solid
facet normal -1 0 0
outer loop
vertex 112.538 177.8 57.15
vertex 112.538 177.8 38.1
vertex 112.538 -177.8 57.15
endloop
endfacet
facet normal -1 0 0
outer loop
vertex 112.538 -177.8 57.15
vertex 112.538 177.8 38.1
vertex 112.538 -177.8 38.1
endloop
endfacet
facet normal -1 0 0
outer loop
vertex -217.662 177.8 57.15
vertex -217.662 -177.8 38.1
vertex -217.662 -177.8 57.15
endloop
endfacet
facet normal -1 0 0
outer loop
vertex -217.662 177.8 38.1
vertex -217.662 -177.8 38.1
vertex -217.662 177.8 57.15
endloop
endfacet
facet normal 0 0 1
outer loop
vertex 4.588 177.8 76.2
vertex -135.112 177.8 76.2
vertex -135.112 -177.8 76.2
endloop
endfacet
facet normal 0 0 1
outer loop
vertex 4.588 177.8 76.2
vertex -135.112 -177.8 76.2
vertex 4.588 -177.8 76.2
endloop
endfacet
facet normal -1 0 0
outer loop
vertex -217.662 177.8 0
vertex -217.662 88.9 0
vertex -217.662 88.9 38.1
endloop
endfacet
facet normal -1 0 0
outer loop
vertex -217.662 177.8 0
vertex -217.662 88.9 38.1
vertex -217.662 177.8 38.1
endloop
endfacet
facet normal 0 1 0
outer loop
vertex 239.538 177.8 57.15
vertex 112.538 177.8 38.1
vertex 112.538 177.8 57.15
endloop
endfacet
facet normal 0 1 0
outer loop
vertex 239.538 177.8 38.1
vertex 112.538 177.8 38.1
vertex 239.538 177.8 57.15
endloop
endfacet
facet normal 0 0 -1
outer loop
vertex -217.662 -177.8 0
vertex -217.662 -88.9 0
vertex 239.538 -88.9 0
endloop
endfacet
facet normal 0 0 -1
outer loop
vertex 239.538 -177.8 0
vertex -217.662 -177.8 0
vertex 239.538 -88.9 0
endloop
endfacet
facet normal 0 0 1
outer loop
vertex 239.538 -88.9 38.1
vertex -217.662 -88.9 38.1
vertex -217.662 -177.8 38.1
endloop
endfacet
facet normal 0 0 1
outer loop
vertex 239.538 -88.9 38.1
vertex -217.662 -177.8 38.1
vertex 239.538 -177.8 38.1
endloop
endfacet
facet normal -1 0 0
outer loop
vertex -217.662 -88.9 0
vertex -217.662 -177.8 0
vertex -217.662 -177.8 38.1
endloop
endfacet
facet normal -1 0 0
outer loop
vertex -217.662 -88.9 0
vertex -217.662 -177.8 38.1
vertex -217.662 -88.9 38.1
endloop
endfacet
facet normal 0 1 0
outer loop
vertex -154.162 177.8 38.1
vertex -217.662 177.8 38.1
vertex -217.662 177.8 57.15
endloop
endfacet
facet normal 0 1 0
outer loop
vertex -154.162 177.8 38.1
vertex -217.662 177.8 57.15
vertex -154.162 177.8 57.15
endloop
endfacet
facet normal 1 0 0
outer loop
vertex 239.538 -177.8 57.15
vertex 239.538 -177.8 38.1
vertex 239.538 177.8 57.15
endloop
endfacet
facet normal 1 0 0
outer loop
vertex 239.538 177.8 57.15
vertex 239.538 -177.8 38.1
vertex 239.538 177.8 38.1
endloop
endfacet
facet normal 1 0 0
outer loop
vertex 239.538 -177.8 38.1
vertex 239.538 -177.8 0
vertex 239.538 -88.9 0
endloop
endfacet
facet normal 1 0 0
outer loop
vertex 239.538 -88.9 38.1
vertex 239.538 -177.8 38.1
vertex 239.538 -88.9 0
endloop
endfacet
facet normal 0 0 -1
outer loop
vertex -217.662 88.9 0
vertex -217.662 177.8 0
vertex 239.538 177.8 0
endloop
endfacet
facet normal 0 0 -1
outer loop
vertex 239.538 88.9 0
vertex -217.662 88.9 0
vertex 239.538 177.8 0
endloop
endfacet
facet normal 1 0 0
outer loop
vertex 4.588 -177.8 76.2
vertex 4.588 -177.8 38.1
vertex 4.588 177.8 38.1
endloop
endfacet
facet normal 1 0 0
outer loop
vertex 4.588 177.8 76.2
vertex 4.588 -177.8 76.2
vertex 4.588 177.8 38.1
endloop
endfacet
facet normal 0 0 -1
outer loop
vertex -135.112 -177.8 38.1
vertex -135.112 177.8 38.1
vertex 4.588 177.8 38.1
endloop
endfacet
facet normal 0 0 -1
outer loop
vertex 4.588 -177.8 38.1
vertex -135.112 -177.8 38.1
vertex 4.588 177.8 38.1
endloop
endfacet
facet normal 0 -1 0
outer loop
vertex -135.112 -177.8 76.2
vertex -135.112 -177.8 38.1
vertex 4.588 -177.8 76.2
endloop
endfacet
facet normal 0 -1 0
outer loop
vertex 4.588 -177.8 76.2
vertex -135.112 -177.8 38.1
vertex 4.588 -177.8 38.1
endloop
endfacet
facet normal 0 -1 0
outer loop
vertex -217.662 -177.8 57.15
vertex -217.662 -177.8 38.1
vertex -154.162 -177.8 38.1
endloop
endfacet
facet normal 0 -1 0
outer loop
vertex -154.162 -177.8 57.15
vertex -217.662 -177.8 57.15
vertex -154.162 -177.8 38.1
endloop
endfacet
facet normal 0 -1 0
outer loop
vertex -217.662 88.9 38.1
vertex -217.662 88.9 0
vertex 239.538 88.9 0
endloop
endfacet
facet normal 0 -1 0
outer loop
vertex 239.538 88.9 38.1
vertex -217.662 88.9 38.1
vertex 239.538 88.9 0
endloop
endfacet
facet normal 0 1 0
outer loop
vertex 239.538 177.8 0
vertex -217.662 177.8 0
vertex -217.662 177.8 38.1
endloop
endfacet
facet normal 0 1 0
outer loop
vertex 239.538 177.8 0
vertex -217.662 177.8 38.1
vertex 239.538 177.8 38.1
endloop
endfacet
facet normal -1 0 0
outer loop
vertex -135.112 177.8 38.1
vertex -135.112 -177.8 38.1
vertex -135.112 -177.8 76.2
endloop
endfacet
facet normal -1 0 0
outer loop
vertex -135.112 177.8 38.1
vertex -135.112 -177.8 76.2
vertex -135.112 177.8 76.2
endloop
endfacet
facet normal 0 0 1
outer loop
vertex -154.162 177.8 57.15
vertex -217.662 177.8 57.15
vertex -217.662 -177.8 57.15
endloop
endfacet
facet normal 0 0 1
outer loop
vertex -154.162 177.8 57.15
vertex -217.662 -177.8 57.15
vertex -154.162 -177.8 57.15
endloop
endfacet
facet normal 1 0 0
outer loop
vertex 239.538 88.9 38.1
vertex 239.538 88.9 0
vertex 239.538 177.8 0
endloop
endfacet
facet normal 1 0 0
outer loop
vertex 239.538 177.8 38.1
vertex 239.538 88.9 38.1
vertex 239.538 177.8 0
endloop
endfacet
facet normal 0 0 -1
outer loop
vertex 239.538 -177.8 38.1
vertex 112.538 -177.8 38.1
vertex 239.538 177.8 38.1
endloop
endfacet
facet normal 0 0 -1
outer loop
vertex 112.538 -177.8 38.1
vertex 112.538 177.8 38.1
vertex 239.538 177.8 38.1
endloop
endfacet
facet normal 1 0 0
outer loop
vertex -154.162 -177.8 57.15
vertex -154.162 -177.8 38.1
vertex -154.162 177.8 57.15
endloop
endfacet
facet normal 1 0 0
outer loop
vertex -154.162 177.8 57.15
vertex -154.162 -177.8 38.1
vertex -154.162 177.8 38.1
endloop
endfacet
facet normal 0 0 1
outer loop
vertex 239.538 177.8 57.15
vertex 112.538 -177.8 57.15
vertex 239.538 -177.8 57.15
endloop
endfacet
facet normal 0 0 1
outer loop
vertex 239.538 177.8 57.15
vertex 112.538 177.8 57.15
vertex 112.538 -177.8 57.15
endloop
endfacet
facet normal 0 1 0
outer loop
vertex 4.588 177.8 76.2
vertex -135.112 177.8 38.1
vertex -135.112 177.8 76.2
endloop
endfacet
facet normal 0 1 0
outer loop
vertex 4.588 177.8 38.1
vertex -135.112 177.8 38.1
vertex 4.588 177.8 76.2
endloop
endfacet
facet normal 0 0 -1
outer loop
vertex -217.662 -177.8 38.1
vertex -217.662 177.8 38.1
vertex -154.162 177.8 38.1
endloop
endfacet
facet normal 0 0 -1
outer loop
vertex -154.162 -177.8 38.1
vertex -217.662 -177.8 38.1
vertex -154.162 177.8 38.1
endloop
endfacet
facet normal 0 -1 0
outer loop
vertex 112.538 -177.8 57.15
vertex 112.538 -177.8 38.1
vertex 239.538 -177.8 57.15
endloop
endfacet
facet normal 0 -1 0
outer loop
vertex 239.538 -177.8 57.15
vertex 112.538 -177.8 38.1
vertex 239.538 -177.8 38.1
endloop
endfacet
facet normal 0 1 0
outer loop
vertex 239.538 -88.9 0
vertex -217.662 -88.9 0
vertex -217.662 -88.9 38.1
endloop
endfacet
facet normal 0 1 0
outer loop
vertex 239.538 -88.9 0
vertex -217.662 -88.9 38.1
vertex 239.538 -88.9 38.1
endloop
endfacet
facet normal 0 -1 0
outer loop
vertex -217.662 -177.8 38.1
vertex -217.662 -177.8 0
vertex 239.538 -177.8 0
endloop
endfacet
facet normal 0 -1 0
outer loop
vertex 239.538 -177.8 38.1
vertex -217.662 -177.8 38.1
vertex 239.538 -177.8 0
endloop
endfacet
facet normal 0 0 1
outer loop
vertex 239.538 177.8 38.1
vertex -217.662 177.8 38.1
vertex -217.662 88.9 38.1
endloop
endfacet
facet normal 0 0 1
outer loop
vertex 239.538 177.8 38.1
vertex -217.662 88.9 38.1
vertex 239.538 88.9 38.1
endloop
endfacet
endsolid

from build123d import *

# Parameters (mm, degrees)
SKETCH2_W             = 457.2
SKETCH2_H             = 88.9
BOSS_EXTRUDE1_DEPTH   = 38.1
BOSS_EXTRUDE1_2_DEPTH = 38.1
SKETCH3_W             = 63.5
SKETCH3_H             = 355.6
BOSS_EXTRUDE2_DEPTH   = 19.05
SKETCH3_W_2           = 127
BOSS_EXTRUDE2_2_DEPTH = 19.05
SKETCH3_3_W           = 139.7
SKETCH3_3_H           = 355.6
BOSS_EXTRUDE3_DEPTH   = 38.1


with BuildPart() as part:
    # Sketch2 → Boss-Extrude1 (new body)
    with BuildSketch(Plane.XY):
        with Locations((10.938284773, 133.35)):
            Rectangle(SKETCH2_W, SKETCH2_H)
    extrude(amount=BOSS_EXTRUDE1_DEPTH)


with BuildPart() as body_2:
    # Sketch2 → Boss-Extrude1 2 (new body)
    with BuildSketch(Plane.XY):
        with Locations((10.938284773, -133.35)):
            Rectangle(SKETCH2_W, SKETCH2_H)
    extrude(amount=BOSS_EXTRUDE1_2_DEPTH)


with BuildPart() as body_3:
    # Sketch3 → Boss-Extrude2 (new body)
    with BuildSketch(Plane.XY.offset(38.1)):
        with Locations((-185.911715227, 0)):
            Rectangle(SKETCH3_W, SKETCH3_H)
    extrude(amount=BOSS_EXTRUDE2_DEPTH)


with BuildPart() as body_4:
    # Sketch3 → Boss-Extrude2 2 (new body)
    with BuildSketch(Plane.XY.offset(38.1)):
        with Locations((176.038284773, 0)):
            Rectangle(SKETCH3_W_2, SKETCH3_H)
    extrude(amount=BOSS_EXTRUDE2_2_DEPTH)


with BuildPart() as body_5:
    # Sketch3<3> → Boss-Extrude3 (new body)
    with BuildSketch(Plane.XY.offset(38.1)):
        with Locations((-65.261715227, 0)):
            Rectangle(SKETCH3_3_W, SKETCH3_3_H)
    extrude(amount=BOSS_EXTRUDE3_DEPTH)


solid = Compound([part.part, body_2.part, body_3.part, body_4.part, body_5.part])
